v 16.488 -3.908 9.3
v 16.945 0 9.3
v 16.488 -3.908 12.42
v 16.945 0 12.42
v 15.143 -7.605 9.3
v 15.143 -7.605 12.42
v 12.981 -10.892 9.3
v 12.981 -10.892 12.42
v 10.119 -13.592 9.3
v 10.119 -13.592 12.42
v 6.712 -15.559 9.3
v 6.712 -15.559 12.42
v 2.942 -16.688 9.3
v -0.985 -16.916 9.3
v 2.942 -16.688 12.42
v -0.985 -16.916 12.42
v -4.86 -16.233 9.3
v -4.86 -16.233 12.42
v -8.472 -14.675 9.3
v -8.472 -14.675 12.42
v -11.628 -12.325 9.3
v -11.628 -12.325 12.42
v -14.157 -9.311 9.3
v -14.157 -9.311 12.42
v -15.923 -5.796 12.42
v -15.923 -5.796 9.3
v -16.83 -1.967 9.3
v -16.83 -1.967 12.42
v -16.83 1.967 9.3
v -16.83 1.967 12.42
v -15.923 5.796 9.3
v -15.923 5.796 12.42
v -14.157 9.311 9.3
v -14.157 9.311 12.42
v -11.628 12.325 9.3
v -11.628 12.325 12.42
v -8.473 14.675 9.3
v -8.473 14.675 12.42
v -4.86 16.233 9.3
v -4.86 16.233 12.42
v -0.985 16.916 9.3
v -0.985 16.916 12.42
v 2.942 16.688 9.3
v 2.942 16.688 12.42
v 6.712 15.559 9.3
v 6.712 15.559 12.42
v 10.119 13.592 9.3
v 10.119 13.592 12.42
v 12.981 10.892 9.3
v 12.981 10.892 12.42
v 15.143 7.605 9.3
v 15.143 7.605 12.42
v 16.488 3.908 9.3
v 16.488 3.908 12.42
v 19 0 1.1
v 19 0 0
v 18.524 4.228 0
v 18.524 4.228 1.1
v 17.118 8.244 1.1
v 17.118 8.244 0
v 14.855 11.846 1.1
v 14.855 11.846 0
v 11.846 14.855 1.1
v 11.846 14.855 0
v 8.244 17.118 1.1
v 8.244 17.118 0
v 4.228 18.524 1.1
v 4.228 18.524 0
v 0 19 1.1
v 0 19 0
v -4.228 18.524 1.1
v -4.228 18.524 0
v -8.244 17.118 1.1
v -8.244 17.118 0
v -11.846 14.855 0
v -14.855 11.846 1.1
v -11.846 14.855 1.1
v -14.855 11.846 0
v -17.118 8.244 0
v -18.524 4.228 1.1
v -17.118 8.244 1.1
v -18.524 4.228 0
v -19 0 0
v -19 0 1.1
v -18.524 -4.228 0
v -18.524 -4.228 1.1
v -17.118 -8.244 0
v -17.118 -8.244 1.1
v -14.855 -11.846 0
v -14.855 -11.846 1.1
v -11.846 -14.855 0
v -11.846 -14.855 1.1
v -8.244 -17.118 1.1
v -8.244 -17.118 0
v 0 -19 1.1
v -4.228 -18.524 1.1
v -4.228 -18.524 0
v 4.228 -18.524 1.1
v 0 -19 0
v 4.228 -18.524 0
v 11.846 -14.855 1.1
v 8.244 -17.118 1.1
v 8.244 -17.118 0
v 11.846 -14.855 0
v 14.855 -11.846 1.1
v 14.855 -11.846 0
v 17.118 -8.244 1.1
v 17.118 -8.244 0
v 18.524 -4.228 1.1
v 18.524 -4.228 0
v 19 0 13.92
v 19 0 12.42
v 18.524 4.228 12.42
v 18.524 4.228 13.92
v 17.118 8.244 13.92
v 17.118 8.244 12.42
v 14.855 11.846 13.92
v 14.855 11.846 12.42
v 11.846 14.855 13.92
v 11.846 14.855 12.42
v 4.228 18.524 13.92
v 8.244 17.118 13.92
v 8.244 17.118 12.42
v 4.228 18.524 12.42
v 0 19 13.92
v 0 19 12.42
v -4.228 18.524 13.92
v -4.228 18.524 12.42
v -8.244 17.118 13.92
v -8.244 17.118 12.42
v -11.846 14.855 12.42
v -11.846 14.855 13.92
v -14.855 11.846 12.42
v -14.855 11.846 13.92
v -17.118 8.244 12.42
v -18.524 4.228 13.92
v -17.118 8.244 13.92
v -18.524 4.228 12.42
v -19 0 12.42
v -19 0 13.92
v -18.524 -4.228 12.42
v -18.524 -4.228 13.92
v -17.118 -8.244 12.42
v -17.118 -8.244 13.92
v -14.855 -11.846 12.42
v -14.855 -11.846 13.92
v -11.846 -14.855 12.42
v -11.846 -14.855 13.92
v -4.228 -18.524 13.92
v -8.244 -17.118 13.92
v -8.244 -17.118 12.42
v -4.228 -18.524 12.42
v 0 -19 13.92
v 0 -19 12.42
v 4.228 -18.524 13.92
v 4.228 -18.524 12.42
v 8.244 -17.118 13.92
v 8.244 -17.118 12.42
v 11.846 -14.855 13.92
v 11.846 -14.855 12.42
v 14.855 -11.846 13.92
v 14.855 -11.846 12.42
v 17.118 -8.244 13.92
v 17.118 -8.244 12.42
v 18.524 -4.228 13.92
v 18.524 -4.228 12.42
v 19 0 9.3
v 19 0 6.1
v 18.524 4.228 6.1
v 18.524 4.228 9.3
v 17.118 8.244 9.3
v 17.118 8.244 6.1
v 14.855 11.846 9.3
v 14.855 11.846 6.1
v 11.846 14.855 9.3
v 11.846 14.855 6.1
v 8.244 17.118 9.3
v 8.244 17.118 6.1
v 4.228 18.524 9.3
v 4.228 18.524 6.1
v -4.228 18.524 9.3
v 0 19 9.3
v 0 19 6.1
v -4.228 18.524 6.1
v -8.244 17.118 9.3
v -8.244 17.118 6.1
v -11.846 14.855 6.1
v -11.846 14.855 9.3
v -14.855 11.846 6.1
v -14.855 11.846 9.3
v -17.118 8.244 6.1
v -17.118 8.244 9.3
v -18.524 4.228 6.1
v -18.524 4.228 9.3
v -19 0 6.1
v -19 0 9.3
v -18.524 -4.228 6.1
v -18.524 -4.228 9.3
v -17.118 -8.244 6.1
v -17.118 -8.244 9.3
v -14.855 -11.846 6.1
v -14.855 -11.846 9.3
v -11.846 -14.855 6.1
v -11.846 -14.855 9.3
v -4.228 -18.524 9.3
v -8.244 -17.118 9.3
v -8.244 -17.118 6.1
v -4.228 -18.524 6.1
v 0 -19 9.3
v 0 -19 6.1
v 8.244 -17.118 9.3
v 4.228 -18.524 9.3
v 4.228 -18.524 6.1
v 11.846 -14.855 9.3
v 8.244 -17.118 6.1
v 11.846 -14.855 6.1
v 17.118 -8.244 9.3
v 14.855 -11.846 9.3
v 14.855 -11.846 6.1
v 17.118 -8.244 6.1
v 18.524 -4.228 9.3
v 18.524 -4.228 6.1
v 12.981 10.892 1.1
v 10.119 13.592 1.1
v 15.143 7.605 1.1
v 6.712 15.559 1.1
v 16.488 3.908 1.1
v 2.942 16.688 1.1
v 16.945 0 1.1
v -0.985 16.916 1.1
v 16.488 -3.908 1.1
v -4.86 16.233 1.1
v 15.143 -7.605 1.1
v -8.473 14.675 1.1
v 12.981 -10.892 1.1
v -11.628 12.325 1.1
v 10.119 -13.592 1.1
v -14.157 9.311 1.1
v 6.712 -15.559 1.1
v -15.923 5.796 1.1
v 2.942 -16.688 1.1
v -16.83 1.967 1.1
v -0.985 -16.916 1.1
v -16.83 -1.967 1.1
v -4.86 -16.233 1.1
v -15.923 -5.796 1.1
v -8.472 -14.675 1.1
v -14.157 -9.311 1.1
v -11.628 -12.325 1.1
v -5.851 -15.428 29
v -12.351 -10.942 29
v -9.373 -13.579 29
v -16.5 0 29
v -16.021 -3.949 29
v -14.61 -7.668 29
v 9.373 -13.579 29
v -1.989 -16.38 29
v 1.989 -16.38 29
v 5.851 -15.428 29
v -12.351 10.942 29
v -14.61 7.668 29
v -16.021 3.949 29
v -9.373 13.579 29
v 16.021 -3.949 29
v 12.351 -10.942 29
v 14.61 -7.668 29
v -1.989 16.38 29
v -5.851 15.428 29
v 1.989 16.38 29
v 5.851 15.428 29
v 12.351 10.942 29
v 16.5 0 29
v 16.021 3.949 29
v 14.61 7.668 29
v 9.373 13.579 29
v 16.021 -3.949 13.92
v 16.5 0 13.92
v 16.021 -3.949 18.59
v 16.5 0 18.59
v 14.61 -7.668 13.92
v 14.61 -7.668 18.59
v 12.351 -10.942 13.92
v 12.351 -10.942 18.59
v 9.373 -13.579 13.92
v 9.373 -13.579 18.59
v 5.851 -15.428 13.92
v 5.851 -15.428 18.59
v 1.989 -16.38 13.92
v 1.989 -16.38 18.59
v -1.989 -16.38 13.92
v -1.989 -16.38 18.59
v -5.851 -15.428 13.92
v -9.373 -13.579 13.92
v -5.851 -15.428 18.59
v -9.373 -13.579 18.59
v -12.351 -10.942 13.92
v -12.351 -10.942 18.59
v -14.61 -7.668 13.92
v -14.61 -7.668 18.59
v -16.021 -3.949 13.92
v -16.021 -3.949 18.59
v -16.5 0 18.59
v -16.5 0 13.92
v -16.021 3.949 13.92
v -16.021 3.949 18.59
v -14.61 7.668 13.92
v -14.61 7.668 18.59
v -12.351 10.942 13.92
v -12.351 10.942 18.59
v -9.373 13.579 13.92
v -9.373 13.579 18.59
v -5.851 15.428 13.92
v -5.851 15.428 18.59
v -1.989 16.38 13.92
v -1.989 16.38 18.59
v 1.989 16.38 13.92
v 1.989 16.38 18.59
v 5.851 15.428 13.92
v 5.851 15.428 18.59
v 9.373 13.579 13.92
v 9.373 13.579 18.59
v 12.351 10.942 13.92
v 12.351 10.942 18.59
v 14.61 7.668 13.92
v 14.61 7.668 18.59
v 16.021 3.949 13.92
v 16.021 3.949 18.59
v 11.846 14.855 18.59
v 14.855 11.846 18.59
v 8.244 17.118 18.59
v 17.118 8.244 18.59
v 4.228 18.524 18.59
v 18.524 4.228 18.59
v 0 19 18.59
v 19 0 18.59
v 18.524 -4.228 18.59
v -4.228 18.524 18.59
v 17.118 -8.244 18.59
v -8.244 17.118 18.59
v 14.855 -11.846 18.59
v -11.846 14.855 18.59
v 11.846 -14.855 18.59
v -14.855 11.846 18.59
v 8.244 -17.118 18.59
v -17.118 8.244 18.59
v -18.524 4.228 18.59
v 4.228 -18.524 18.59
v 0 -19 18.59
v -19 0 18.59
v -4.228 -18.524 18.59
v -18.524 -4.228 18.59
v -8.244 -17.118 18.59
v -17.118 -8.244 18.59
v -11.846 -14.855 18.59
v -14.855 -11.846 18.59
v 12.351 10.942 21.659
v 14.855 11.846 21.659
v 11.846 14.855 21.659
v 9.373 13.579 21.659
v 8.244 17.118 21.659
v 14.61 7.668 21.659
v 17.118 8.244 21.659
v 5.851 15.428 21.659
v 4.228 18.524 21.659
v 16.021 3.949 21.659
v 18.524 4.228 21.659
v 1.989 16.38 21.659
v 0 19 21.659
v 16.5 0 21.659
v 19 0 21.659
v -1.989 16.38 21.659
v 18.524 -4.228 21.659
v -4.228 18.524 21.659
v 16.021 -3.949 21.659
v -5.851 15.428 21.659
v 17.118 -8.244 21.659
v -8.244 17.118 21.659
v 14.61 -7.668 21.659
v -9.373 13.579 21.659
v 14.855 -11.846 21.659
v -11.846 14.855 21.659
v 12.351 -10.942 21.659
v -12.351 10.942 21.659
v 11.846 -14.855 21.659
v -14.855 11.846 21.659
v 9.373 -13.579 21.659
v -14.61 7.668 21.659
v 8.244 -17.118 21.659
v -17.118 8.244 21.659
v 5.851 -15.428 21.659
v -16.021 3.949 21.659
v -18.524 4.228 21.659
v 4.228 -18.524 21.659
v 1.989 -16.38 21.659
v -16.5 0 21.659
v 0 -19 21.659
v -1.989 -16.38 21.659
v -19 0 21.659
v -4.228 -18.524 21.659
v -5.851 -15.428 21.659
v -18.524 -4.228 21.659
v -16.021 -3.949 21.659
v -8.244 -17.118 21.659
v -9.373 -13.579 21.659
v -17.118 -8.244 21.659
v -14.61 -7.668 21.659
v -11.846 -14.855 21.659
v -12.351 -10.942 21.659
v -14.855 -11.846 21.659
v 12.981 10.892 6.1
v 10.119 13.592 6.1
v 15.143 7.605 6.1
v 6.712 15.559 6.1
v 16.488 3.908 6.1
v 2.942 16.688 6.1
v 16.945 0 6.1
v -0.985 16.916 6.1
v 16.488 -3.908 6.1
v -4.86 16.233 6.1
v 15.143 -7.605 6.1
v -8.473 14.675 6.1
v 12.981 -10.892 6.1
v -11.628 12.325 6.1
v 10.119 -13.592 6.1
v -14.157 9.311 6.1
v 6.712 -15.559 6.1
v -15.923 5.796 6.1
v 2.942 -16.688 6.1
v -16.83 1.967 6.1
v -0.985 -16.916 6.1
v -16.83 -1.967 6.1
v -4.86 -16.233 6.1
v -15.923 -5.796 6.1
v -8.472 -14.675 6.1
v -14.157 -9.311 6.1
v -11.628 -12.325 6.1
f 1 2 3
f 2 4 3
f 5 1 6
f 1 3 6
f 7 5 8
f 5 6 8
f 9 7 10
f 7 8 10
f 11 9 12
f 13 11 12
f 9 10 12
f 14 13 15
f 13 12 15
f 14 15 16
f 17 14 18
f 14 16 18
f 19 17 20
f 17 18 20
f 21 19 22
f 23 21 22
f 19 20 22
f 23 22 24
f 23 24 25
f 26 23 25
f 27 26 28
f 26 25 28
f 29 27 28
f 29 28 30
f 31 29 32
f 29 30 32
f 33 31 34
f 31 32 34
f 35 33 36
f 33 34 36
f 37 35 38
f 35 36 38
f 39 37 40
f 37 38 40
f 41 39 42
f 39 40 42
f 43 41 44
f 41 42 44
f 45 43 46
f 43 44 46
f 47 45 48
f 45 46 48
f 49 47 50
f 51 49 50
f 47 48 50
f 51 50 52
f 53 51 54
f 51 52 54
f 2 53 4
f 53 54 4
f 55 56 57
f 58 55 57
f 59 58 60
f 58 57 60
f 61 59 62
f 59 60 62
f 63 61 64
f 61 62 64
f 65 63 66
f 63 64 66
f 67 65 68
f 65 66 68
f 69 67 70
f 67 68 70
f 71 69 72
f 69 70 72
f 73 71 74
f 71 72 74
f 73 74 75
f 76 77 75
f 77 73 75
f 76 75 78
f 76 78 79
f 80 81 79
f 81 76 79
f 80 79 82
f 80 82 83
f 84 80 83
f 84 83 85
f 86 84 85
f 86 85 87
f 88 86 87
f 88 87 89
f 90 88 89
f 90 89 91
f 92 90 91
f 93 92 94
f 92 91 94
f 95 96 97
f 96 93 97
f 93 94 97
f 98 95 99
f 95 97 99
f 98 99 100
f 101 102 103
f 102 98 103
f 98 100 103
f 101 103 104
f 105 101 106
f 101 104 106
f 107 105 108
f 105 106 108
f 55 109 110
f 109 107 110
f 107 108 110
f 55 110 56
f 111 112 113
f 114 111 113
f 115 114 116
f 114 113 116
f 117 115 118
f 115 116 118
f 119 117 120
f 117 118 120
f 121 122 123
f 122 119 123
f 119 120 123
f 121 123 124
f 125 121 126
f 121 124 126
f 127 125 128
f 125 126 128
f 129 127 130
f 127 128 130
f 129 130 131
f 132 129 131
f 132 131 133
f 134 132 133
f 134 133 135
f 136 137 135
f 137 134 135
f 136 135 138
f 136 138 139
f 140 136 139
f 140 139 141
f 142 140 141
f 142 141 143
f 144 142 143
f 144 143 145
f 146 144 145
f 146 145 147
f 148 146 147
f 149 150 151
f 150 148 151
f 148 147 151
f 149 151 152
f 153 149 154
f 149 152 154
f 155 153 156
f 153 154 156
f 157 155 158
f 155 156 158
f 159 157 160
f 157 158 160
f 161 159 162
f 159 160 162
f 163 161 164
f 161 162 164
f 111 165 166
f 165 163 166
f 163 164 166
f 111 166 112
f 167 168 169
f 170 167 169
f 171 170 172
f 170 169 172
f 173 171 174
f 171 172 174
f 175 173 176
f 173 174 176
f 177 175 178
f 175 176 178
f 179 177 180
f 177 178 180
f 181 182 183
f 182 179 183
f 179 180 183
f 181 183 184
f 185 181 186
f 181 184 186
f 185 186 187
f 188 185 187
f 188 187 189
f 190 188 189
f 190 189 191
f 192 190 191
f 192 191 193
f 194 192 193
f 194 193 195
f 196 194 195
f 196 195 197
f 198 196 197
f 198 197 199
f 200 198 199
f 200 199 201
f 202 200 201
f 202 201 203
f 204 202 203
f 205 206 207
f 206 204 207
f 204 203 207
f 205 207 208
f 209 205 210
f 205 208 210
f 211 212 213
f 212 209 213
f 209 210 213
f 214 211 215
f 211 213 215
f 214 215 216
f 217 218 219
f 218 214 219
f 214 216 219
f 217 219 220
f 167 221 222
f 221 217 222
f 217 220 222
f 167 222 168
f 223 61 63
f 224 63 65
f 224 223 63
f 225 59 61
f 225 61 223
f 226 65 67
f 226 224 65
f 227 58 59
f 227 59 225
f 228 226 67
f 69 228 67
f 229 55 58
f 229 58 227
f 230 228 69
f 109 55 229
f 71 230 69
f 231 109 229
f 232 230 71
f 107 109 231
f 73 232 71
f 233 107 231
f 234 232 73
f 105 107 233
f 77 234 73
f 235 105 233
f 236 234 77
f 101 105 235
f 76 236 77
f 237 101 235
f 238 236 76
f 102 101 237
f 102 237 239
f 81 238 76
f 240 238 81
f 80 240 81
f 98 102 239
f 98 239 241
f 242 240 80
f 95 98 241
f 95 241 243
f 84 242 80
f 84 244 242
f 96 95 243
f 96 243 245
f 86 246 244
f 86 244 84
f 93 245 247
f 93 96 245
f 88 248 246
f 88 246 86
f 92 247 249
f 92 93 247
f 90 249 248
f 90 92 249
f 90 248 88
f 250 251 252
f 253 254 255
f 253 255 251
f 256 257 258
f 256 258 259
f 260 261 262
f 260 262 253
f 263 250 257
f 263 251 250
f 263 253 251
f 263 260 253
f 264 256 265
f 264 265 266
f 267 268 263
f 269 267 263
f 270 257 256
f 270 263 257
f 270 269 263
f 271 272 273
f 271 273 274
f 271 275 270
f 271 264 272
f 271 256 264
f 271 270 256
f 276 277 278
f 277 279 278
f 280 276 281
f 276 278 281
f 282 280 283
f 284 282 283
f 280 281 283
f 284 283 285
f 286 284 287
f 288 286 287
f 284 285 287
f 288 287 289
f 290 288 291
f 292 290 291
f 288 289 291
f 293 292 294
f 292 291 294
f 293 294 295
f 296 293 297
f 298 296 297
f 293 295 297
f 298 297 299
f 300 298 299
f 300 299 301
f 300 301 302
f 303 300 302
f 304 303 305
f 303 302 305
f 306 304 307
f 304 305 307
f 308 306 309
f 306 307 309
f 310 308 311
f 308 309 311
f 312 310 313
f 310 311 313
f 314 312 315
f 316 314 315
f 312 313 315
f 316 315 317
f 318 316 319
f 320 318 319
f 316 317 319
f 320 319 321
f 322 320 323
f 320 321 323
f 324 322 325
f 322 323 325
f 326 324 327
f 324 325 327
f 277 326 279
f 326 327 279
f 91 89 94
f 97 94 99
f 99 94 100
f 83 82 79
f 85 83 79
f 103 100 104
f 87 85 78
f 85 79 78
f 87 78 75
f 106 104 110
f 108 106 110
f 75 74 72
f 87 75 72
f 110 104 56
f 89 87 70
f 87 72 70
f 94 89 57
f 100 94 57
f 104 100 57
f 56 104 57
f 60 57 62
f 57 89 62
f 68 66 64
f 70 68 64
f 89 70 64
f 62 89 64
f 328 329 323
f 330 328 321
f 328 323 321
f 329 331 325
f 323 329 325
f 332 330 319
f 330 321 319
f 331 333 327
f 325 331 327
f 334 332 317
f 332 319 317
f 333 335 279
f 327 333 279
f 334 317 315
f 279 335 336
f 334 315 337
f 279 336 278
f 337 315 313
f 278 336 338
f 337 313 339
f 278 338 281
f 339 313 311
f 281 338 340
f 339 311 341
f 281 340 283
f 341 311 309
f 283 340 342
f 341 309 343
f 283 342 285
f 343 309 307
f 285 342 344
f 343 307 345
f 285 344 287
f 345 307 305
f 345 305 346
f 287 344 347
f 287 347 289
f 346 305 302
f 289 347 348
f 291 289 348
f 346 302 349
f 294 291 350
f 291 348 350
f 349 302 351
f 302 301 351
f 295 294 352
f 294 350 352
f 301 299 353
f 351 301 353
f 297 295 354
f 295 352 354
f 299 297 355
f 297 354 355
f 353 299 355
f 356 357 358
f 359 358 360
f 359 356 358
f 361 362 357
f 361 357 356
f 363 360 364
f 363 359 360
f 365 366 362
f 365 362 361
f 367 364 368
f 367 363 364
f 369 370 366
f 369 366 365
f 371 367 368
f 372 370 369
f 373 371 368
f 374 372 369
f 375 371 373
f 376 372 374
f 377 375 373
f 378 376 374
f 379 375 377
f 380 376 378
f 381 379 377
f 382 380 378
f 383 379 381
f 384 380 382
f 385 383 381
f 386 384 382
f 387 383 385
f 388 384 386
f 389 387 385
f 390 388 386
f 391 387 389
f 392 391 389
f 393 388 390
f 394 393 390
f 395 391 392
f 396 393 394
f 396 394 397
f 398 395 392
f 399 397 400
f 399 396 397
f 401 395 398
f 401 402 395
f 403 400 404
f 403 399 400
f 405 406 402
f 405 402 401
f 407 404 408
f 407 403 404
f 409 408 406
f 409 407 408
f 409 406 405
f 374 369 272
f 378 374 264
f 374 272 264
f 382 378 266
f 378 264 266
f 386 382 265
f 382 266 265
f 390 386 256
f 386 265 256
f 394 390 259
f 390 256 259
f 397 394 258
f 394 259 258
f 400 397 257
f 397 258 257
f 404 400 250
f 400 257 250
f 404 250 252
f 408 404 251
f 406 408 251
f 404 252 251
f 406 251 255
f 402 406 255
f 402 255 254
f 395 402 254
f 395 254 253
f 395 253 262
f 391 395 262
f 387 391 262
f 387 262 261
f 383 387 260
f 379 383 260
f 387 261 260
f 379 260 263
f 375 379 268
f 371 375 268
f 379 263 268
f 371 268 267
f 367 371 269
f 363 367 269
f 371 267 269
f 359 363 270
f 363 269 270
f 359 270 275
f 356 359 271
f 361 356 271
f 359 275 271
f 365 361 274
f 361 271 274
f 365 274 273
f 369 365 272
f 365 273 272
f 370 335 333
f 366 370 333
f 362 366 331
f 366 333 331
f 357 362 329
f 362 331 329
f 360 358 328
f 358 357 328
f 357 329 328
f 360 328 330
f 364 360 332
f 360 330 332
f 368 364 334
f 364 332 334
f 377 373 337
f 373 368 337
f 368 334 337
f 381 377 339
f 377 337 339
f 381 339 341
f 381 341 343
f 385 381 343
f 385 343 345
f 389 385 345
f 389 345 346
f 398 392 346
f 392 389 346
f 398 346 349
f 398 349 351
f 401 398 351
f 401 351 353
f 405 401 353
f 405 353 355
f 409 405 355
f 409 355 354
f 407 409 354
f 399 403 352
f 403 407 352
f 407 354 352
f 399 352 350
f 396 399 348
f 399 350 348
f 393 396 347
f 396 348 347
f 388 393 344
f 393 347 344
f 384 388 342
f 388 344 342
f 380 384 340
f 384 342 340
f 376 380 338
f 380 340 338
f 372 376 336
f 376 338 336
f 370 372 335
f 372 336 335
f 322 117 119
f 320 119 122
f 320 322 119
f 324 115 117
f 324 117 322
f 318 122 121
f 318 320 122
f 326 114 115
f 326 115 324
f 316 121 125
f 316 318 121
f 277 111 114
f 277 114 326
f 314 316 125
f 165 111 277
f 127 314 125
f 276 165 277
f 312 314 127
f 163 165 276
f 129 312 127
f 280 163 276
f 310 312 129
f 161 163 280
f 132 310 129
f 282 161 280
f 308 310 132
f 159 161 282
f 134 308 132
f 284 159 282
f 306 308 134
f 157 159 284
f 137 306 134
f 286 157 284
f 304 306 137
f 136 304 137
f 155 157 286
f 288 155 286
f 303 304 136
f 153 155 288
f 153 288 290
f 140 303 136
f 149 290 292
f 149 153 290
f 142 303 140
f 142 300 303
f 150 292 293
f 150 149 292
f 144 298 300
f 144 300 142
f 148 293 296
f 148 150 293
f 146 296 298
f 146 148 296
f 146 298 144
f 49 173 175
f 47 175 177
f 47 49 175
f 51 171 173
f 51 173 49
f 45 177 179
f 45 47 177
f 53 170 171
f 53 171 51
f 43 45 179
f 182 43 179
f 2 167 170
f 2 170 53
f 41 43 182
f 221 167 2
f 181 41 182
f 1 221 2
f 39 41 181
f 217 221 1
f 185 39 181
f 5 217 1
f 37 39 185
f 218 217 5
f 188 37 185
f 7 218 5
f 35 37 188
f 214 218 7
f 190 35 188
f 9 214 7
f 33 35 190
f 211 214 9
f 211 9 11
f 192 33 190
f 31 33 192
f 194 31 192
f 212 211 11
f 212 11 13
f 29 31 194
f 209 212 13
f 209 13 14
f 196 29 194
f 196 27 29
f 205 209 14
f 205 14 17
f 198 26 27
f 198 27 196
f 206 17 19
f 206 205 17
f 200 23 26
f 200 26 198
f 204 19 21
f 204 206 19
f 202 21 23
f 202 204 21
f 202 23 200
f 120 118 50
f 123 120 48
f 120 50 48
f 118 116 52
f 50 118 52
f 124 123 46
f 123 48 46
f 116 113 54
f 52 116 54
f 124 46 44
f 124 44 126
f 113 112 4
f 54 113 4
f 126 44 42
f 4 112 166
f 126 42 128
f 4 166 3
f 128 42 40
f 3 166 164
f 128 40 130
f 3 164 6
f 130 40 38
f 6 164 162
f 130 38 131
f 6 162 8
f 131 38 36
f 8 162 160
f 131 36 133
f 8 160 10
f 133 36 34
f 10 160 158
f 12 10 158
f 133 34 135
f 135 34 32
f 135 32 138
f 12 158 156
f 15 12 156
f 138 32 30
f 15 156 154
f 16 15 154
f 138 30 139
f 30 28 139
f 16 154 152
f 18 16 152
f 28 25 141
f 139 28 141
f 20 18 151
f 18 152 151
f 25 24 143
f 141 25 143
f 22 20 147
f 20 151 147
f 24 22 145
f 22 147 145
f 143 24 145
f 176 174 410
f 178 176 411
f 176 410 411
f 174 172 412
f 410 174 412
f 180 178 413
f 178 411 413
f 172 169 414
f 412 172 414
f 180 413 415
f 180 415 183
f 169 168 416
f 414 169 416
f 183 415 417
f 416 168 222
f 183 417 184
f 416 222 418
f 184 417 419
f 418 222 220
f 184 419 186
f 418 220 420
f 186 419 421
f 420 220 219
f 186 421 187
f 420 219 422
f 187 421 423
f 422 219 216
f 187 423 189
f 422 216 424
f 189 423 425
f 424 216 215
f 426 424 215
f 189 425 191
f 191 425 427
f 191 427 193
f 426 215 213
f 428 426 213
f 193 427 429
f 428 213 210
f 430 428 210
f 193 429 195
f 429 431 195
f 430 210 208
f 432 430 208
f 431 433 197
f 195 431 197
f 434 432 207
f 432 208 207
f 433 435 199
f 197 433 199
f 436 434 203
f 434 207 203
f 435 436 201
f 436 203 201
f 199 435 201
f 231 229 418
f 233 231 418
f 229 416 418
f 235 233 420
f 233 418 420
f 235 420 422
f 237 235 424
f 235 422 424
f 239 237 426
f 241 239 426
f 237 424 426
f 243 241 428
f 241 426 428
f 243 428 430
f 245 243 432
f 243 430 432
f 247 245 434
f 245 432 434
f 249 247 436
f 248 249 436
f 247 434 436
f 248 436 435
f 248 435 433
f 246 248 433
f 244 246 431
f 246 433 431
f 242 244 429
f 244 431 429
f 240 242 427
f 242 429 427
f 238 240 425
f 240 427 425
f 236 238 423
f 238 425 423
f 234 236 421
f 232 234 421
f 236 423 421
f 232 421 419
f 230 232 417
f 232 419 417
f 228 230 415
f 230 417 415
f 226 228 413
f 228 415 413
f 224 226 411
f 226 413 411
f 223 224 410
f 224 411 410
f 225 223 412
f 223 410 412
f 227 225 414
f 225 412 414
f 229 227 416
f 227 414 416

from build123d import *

# Parameters (mm, degrees)
F0_R     = 19
F1_DEPTH = 29
F2_W     = 13.055
F2_H     = 5
F2_H_2   = 3.12
F2_W_2   = 13.499867
F2_H_3   = 4.67
F2_W_3   = 13.901473
F2_H_4   = 10


with BuildPart() as f1:
    # F0 (on Top) → F1 (new body)
    with BuildSketch(Plane.XY):
        Circle(F0_R)
    extrude(amount=F1_DEPTH)

    # F2 (on Front) → F3 (revolve, cut)
    with BuildSketch(Plane.XZ):
        with Locations((23.4725, 3.6)):
            Rectangle(F2_W, F2_H)
        with Locations((23.4725, 10.86)):
            Rectangle(F2_W, F2_H_2)
        with Locations((23.250066, 16.255)):
            Rectangle(F2_W_2, F2_H_3)
        with Locations((23.450869, 26.65892)):
            Rectangle(F2_W_3, F2_H_4)
    revolve(axis=Axis((0, 0, 8.831585), (0, 0, -1)), mode=Mode.SUBTRACT)


solid = f1.part
